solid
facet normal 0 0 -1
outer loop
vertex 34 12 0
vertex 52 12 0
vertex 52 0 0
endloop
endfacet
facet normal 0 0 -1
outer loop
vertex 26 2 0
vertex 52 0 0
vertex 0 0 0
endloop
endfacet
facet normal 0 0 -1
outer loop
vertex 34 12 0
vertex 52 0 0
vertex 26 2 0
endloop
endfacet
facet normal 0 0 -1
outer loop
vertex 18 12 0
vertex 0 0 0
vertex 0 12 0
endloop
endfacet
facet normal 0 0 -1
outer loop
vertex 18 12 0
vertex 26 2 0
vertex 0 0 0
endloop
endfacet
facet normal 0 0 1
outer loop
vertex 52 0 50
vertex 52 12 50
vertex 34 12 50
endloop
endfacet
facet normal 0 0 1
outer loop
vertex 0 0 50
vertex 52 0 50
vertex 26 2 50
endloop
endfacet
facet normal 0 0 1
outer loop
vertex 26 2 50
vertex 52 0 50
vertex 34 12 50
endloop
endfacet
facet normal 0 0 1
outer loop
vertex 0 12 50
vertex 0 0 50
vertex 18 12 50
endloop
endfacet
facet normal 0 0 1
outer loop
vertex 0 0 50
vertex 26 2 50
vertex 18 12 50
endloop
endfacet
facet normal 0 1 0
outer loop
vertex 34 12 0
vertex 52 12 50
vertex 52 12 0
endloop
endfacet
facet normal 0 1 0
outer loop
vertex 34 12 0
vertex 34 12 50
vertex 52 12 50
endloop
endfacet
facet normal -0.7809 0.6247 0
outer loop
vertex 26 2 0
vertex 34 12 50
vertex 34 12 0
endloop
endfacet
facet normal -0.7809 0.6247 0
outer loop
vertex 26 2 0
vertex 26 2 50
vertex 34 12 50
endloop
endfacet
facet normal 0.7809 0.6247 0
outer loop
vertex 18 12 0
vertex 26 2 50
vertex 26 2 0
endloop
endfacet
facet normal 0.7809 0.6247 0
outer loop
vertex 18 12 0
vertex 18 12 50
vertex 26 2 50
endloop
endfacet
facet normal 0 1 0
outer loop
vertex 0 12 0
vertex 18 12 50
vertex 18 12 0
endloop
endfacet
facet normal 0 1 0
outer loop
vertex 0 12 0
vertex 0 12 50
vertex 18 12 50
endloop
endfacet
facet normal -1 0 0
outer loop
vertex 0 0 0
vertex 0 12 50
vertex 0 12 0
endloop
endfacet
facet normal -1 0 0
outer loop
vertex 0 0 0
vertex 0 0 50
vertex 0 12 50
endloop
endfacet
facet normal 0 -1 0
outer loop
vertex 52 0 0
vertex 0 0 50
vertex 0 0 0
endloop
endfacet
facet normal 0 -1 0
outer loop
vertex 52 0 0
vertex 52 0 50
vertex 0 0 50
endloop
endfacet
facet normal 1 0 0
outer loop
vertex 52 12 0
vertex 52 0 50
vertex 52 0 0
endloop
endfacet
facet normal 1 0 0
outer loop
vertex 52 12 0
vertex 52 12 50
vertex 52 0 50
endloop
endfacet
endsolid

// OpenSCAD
$fn = 32;

// ----------------------------------------------------------------------
// V guide rail: vway, 52 mm wide
// ----------------------------------------------------------------------

// --- parameters (mm) ---
rail_w = 52;              // rail width, X
base_t = 12;              // base plate thickness
v_depth = 10;             // V feature depth / height
v_half_w = 8;             // half width of the V at the base face
plate_t = 50;             // rail length, Z (the extrusion height)

profile = [[0, 0], [52, 0], [52, 12], [34, 12], [26, 2], [18, 12], [0, 12]];  // primary outline, 7 points, counter clockwise

// --- the one profile operation ---
linear_extrude(height = plate_t) polygon(points = profile);
